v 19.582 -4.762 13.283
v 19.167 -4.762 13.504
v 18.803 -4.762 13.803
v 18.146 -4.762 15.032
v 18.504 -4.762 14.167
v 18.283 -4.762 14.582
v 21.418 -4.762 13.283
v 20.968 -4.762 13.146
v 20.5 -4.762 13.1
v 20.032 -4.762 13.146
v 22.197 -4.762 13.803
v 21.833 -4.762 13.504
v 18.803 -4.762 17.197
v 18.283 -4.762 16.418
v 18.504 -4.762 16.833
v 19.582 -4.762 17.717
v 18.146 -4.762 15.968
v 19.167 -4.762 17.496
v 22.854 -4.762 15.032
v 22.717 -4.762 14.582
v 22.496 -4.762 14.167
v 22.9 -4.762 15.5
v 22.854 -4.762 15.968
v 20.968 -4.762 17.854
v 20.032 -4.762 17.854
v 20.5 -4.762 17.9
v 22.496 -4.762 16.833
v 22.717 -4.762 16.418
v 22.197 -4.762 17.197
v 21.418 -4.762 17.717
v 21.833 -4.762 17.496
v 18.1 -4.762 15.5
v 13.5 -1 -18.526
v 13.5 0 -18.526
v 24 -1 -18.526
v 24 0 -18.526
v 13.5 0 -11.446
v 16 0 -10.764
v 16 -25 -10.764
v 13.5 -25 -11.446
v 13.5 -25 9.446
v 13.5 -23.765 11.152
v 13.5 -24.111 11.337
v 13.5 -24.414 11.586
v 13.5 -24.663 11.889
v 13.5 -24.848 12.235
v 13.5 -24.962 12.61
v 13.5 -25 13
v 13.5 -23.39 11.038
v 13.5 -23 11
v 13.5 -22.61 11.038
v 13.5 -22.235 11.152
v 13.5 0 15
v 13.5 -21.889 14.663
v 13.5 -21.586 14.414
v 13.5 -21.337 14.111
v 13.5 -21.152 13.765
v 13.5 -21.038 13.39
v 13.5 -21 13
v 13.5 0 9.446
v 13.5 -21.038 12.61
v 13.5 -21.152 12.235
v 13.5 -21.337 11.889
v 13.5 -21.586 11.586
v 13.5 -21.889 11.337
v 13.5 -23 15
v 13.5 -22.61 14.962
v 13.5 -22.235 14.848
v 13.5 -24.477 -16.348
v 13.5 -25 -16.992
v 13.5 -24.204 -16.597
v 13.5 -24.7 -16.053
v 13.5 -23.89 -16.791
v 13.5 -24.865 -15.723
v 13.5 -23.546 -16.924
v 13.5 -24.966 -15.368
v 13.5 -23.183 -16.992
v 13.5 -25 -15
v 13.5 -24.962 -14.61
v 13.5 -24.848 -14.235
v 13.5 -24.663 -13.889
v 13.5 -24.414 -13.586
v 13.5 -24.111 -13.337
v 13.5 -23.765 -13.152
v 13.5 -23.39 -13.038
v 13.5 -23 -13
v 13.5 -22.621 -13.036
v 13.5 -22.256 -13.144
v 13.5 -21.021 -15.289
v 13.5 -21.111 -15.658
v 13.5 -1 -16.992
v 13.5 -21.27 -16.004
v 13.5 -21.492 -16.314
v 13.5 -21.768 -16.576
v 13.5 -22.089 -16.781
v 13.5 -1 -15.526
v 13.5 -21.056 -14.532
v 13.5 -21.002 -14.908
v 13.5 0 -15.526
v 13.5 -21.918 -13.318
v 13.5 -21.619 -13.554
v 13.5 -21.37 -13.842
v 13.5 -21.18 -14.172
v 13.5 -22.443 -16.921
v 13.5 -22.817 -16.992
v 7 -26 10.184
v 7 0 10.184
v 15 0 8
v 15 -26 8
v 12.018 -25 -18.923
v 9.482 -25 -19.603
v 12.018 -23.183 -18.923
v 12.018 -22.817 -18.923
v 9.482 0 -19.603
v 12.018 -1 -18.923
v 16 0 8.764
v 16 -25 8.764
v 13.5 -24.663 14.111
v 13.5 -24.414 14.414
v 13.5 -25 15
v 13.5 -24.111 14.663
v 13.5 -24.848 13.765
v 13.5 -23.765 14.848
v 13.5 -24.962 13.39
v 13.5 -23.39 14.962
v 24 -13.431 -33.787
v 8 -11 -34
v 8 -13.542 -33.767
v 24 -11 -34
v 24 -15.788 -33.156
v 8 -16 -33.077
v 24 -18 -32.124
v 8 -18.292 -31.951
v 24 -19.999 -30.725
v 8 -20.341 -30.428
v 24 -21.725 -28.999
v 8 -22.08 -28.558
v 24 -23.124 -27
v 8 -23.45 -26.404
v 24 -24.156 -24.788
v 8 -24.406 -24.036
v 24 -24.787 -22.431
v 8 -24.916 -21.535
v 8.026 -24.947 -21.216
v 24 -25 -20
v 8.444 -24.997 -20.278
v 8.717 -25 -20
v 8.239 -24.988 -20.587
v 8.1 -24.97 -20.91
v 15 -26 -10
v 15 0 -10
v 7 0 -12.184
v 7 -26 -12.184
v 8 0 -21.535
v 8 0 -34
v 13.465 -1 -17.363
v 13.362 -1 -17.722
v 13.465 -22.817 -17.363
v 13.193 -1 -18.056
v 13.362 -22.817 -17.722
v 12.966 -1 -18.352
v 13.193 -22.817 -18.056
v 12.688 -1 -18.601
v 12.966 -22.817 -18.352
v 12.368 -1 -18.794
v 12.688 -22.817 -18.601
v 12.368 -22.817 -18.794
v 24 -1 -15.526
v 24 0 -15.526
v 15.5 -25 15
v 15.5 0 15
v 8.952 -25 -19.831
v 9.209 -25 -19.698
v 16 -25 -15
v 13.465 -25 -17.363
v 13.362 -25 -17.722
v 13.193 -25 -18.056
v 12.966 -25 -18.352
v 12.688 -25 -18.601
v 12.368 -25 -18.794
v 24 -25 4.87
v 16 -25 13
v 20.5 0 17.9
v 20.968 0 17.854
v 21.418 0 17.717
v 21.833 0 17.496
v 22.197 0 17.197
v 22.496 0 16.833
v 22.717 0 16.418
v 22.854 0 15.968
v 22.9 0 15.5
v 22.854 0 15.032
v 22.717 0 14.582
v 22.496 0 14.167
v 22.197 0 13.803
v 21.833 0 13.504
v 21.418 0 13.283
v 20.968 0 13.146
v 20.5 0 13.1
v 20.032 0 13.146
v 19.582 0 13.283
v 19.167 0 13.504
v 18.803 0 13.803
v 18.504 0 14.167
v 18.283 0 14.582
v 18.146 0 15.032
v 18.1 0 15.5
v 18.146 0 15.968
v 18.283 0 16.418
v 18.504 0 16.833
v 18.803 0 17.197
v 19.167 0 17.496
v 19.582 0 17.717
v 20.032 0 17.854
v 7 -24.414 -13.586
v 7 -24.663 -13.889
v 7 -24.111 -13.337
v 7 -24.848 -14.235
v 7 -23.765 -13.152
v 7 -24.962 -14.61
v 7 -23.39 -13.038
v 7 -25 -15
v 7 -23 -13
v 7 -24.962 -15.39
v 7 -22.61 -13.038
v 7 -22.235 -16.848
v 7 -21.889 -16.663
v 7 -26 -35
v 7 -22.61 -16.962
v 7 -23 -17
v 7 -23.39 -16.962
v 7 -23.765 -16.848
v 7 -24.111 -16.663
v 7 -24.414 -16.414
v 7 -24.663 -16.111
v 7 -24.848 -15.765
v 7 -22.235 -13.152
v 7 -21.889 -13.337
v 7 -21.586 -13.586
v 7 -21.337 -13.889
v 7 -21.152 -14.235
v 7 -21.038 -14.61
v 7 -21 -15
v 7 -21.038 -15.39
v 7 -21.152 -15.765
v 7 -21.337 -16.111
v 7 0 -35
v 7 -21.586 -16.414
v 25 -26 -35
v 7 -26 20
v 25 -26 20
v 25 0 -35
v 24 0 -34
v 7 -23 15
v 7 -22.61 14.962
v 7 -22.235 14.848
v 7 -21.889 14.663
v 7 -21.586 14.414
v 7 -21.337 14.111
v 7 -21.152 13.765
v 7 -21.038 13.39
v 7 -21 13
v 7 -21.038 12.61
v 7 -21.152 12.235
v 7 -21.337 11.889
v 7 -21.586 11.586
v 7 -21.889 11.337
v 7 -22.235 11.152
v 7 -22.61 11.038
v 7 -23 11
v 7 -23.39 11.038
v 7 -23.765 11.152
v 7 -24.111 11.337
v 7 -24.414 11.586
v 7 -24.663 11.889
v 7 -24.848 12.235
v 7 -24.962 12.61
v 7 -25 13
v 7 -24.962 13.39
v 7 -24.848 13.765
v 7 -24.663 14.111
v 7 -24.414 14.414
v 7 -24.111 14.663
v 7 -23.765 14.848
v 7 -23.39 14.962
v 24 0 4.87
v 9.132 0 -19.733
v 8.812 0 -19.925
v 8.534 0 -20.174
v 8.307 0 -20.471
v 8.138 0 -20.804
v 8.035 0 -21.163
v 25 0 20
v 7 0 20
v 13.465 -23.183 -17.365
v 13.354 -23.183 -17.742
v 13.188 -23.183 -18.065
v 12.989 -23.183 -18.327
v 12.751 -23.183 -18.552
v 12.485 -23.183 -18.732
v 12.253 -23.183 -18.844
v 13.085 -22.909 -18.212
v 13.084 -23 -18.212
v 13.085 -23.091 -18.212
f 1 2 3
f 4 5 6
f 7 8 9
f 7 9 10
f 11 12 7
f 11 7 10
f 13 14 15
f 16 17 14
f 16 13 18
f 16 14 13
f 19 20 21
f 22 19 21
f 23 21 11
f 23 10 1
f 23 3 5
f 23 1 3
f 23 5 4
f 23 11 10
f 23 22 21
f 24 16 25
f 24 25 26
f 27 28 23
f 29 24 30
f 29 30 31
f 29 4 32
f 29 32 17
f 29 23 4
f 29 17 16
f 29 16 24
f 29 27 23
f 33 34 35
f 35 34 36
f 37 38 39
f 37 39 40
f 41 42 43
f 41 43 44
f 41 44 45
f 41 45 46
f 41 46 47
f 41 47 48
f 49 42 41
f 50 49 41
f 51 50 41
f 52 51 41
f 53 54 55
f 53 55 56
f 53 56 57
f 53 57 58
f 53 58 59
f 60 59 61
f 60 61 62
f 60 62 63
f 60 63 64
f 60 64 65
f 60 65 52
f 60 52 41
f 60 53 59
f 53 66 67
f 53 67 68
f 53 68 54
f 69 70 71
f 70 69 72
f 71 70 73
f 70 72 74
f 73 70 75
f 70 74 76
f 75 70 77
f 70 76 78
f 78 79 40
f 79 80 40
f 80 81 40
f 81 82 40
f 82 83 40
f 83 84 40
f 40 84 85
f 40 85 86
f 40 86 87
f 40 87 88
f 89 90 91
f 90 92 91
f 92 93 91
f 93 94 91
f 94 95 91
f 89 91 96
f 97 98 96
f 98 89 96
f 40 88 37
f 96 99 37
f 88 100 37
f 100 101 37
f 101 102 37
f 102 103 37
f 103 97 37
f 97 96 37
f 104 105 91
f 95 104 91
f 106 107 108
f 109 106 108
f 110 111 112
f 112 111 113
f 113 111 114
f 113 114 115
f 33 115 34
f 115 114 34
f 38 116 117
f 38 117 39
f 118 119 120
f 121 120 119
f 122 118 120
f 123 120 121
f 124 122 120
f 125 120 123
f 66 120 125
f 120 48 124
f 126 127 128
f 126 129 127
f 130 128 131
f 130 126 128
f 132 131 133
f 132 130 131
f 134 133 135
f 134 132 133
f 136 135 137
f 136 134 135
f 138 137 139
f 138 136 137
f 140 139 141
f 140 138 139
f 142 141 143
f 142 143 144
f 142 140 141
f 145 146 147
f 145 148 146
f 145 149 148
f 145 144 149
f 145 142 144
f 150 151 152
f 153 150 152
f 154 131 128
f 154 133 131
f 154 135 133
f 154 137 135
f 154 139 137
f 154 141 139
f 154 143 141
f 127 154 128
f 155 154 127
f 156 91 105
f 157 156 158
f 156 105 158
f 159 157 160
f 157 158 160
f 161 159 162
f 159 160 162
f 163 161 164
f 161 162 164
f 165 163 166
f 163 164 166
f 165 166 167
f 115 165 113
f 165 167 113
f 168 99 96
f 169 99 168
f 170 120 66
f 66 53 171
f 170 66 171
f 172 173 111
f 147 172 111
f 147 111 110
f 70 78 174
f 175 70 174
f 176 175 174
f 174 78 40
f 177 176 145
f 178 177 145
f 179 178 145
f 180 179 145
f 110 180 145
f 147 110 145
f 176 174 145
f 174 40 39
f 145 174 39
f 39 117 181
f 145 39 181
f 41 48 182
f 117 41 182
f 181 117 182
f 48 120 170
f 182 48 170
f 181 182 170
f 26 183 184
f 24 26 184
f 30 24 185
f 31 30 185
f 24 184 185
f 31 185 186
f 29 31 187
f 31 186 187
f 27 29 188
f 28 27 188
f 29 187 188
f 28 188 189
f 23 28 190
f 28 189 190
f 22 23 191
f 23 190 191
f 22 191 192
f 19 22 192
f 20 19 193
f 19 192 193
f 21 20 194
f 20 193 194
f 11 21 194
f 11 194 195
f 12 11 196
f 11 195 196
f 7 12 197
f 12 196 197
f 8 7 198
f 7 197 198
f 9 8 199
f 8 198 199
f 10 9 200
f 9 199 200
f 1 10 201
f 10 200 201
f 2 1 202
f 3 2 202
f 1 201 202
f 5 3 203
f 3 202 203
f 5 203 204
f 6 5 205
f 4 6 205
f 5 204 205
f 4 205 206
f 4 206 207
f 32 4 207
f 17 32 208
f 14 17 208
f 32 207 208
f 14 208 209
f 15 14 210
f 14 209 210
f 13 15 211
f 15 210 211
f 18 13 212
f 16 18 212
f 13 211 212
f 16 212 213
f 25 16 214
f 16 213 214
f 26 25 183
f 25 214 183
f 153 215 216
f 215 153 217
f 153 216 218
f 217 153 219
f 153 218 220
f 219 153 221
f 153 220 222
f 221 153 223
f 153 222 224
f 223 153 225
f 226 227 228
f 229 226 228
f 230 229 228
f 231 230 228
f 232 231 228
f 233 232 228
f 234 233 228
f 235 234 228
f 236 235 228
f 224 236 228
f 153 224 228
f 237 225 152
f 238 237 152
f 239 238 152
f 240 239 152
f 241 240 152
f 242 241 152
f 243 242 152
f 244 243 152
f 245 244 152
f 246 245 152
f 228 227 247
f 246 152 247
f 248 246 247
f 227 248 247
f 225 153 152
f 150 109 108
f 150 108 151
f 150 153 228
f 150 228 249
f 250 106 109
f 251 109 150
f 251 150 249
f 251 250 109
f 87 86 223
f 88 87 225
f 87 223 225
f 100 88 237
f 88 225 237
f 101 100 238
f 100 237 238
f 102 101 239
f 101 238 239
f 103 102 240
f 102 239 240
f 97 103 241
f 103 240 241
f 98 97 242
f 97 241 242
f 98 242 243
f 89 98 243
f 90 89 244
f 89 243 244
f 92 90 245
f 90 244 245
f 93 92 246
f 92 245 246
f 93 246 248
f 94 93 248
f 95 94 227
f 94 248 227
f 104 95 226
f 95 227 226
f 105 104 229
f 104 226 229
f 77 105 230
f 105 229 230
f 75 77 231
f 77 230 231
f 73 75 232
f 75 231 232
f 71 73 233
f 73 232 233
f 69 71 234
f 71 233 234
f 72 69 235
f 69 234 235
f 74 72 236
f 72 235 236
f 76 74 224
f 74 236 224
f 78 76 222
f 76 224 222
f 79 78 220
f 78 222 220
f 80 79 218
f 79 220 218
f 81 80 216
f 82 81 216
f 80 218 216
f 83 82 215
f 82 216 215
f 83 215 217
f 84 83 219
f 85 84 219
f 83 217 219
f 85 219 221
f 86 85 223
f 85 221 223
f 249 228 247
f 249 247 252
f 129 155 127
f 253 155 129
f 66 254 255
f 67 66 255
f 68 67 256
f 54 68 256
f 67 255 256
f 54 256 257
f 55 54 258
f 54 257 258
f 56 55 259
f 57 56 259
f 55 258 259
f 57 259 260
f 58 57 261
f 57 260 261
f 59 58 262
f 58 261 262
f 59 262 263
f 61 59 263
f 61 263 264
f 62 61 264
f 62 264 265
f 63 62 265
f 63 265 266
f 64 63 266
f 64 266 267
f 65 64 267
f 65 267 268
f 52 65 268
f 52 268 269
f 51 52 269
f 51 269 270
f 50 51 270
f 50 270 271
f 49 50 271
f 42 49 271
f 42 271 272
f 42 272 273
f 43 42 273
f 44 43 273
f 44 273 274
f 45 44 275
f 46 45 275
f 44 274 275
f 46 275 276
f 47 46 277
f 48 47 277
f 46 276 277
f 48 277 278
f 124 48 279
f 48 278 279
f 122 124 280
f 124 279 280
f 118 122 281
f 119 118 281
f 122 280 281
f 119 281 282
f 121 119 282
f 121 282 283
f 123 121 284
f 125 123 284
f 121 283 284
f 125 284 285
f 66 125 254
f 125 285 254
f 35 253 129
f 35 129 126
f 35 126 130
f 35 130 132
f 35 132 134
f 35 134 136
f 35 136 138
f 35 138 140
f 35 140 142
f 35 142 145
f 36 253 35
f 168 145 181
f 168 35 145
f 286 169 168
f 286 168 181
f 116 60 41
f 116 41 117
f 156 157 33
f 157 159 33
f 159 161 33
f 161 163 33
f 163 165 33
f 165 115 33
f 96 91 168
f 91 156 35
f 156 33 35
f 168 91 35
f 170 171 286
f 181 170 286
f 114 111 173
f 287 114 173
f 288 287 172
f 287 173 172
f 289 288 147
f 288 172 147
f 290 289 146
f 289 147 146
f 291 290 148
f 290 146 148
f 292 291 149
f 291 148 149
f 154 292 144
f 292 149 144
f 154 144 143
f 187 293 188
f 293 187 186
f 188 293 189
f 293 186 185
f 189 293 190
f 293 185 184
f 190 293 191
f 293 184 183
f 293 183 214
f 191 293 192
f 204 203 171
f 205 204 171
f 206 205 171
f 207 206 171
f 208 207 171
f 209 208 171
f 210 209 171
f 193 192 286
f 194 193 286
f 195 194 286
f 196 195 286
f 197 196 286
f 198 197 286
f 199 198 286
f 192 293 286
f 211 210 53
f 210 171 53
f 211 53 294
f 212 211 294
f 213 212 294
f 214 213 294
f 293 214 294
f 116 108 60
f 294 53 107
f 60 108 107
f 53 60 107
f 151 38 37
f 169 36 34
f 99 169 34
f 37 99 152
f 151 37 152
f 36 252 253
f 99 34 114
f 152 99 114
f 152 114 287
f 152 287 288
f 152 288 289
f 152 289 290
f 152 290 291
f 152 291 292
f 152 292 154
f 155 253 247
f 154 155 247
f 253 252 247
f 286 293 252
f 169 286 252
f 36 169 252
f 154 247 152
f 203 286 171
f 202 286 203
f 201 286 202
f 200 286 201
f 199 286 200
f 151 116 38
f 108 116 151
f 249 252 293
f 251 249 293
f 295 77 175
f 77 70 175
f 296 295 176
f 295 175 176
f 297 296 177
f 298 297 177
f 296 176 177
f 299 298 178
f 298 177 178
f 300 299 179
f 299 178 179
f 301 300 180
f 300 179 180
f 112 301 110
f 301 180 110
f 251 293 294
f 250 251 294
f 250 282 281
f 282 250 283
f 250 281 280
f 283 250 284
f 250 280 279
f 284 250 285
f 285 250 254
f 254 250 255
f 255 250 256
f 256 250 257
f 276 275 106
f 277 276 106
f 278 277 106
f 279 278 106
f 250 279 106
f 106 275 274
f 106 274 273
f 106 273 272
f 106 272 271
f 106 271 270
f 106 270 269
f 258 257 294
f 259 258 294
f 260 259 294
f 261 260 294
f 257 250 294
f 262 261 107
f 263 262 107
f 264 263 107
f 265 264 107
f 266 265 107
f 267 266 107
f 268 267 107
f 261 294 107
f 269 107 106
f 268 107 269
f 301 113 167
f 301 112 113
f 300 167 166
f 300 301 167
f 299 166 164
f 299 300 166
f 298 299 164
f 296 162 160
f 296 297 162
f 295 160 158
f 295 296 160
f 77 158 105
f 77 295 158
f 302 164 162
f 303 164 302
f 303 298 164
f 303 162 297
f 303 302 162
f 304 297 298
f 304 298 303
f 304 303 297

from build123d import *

# Parameters (mm, degrees)
BOSS_EXTRUDE2_DEPTH = 26
SHELL1_T            = -1
FILLET1_R           = 14
BOSS_EXTRUDE3_REACH = 52.259
FILLET2_R           = 14
SKETCH8_W           = 10.5
SKETCH8_H           = 3
BOSS_EXTRUDE4_DEPTH = 1
SKETCH4_R           = 2
CUT_EXTRUDE1_DEPTH  = 9
BOSS_EXTRUDE5_REACH = 52.259
SKETCH7_R           = 2.4
CUT_EXTRUDE2_DEPTH  = 4.7625
FILLET5_R           = 2


with BuildPart() as part:
    # Sketch2 → Boss-Extrude2 (new body)
    with BuildSketch(Plane.XZ):
        Polygon((7, -12.183821406), (7, -35), (25, -35), (25, 20), (7, 20), (7, 10.183821406), (15, 8), (15, -10), align=None)
    extrude(amount=BOSS_EXTRUDE2_DEPTH)

    # Shell1
    shell1_openings = [part.faces().sort_by_distance(p)[0] for p in [
        (17.00255576, 0, -8.766773004),
    ]]
    offset(amount=SHELL1_T, openings=shell1_openings, kind=Kind.INTERSECTION)

    # Fillet1
    fillet1_edges = [part.edges().sort_by_distance(p)[0] for p in [
        (16, -25, -34),
    ]]
    fillet(fillet1_edges, radius=FILLET1_R)

    # Sketch3 → Boss-Extrude3 (add, up to next)
    with BuildSketch(Plane(origin=(0, 0, 0), x_dir=(1, 0, 0), z_dir=(0, 1, 0)), mode=Mode.PRIVATE) as boss_extrude3_sk1:
        Polygon((13.5, 11.446055541), (8, 12.947432757), (8, 20), (13.5, 18.526279442), align=None)
    boss_extrude3_tool1 = extrude(boss_extrude3_sk1.sketch, amount=-BOSS_EXTRUDE3_REACH, mode=Mode.PRIVATE) - part.part
    # Sketch3 → Boss-Extrude3 (add, up to next)
    with BuildSketch(Plane(origin=(0, 0, 0), x_dir=(1, 0, 0), z_dir=(0, 1, 0)), mode=Mode.PRIVATE) as boss_extrude3_sk2:
        Polygon((13.5, -9.446055541), (8, -10.947432757), (8, -19), (13.5, -19), align=None)
    boss_extrude3_tool2 = extrude(boss_extrude3_sk2.sketch, amount=-BOSS_EXTRUDE3_REACH, mode=Mode.PRIVATE) - part.part
    add(boss_extrude3_tool1.solids().sort_by_distance((10.751794, 0, -15.729457))[0])
    add(boss_extrude3_tool2.solids().sort_by_distance((10.828168, 0, 14.587703))[0])

    # Fillet2
    # the kernel refuses this fillet: 14 mm, written as the material it adds along each edge
    with BuildSketch(Plane(origin=(24, 0, 19), x_dir=(0, 0, -1), z_dir=(0, -1, 0))) as fillet2_piece_1:
        with BuildLine():
            CenterArc((13.555441712, -14), FILLET2_R, 90, 75.522487814)
            Line((0, -10.5), (-0.271108834, -10.43))
            ThreePointArc((-0.271108834, -10.43), (-0.28, -5.25), (-0.28, 0))
            Line((-0.28, 0), (0, 0.28))
            Line((0, 0.28), (13.555441712, 0.28))
            Line((13.555441712, 0.28), (13.555441712, 0))
        make_face()
    extrude(amount=25)

    # Sketch8 → Boss-Extrude4 (add)
    with BuildSketch(Plane(origin=(0, 0, 0), x_dir=(1, 0, 0), z_dir=(0, 1, 0))):
        with Locations((18.75, 17.026279442)):
            Rectangle(SKETCH8_W, SKETCH8_H)
    extrude(amount=-BOSS_EXTRUDE4_DEPTH)

    # Sketch4 → Cut-Extrude1 (cut)
    with BuildSketch(Plane.ZY.offset(-7)):
        with Locations((-15, -23)):
            Circle(SKETCH4_R)
        with Locations((13, -23)):
            Circle(SKETCH4_R)
    extrude(amount=-CUT_EXTRUDE1_DEPTH, mode=Mode.SUBTRACT)

    # Sketch9 → Boss-Extrude5 (add, up to next)
    with BuildSketch(Plane(origin=(0, 0, 0), x_dir=(1, 0, 0), z_dir=(0, 1, 0)), mode=Mode.PRIVATE) as boss_extrude5_sk1:
        with BuildLine():
            Line((13.5, -15), (15.5, -15))
            Line((15.5, -15), (24, -4.870094463))
            Line((24, -4.870094463), (24, -5.444558288))
            ThreePointArc((24, -5.444558288), (21.067971811, -14.017772388), (13.5, -19))
            Line((13.5, -19), (13.5, -15))
        make_face()
    boss_extrude5_tool1 = extrude(boss_extrude5_sk1.sketch, amount=-BOSS_EXTRUDE5_REACH, mode=Mode.PRIVATE) - part.part
    add(boss_extrude5_tool1.solids().sort_by_distance((18.990726, 0, 13.031002))[0])

    # Sketch7 → Cut-Extrude2 (cut)
    with BuildSketch(Plane(origin=(0, 0, 0), x_dir=(1, 0, 0), z_dir=(0, 1, 0))):
        with Locations(Location((20.5, -15.5, 0), (0, 0, 270))):
            Circle(SKETCH7_R)
    extrude(amount=-CUT_EXTRUDE2_DEPTH, mode=Mode.SUBTRACT)

    # Fillet5
    fillet5_edges = [part.edges().sort_by_distance(p)[0] for p in [
        (8, -12.5, -20),
        (13.5, -13, -18.526279442),
    ]]
    fillet(fillet5_edges, radius=FILLET5_R)


solid = part.part
